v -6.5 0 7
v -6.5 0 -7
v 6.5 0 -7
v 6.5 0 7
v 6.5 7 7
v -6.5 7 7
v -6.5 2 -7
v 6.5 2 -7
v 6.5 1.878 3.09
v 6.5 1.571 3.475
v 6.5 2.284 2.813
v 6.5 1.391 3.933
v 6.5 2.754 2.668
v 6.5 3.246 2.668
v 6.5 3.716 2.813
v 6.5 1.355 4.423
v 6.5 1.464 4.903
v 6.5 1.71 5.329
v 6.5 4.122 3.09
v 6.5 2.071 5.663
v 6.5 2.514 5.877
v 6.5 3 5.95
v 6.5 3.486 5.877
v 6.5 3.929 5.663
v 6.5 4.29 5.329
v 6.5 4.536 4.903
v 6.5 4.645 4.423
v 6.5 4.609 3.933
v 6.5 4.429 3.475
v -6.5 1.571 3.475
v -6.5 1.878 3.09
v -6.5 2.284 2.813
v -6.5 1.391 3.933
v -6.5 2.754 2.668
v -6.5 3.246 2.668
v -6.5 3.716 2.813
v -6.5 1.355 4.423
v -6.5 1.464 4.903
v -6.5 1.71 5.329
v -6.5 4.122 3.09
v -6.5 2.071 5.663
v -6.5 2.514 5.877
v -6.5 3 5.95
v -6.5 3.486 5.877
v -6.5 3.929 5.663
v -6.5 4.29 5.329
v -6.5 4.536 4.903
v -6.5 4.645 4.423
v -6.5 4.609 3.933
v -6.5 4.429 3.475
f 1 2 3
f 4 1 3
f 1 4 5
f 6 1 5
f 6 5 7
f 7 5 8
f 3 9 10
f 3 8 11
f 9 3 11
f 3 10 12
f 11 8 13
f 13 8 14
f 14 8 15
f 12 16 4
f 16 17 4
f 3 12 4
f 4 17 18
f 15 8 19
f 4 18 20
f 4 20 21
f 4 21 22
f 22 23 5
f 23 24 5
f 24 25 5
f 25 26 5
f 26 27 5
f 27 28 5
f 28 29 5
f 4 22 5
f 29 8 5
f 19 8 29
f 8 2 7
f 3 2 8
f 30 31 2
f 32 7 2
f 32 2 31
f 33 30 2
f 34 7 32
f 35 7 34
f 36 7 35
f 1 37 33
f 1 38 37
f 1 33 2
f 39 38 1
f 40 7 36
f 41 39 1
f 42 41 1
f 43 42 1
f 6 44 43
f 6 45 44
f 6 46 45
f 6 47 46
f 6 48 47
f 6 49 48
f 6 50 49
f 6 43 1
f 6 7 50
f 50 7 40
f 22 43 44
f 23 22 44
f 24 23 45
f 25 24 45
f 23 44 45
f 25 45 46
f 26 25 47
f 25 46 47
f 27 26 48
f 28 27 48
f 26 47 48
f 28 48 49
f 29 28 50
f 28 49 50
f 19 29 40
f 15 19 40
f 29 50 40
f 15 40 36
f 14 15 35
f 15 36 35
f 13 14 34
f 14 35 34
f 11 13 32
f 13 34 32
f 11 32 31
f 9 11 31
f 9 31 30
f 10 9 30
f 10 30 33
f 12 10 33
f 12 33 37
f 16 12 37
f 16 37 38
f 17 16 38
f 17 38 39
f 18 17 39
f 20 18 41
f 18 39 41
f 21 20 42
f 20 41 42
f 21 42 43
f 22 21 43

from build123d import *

# Parameters (mm, degrees)
SKETCH1_W           = 13
SKETCH1_H           = 14
BOSS_EXTRUDE1_DEPTH = 2
BOSS_EXTRUDE2_DEPTH = 13
SKETCH3_R           = 1.65
CUT_EXTRUDE1_DEPTH  = 13


with BuildPart() as part:
    # Sketch1 → Boss-Extrude1 (new body)
    with BuildSketch(Plane(origin=(0, 0, 0), x_dir=(1, 0, 0), z_dir=(0, 1, 0))):
        Rectangle(SKETCH1_W, SKETCH1_H)
    extrude(amount=BOSS_EXTRUDE1_DEPTH)

    # Sketch2 → Boss-Extrude2 (add)
    with BuildSketch(Plane(origin=(6.5, 0, 0), x_dir=(0, 0, -1), z_dir=(1, 0, 0))):
        Polygon((-7, 2), (-7, 7), (7, 2), align=None)
    extrude(amount=-BOSS_EXTRUDE2_DEPTH)

    # Sketch3 → Cut-Extrude1 (cut)
    with BuildSketch(Plane.ZY.offset(6.5)):
        with Locations((4.3, 3)):
            Circle(SKETCH3_R)
    extrude(amount=-CUT_EXTRUDE1_DEPTH, mode=Mode.SUBTRACT)


solid = part.part
